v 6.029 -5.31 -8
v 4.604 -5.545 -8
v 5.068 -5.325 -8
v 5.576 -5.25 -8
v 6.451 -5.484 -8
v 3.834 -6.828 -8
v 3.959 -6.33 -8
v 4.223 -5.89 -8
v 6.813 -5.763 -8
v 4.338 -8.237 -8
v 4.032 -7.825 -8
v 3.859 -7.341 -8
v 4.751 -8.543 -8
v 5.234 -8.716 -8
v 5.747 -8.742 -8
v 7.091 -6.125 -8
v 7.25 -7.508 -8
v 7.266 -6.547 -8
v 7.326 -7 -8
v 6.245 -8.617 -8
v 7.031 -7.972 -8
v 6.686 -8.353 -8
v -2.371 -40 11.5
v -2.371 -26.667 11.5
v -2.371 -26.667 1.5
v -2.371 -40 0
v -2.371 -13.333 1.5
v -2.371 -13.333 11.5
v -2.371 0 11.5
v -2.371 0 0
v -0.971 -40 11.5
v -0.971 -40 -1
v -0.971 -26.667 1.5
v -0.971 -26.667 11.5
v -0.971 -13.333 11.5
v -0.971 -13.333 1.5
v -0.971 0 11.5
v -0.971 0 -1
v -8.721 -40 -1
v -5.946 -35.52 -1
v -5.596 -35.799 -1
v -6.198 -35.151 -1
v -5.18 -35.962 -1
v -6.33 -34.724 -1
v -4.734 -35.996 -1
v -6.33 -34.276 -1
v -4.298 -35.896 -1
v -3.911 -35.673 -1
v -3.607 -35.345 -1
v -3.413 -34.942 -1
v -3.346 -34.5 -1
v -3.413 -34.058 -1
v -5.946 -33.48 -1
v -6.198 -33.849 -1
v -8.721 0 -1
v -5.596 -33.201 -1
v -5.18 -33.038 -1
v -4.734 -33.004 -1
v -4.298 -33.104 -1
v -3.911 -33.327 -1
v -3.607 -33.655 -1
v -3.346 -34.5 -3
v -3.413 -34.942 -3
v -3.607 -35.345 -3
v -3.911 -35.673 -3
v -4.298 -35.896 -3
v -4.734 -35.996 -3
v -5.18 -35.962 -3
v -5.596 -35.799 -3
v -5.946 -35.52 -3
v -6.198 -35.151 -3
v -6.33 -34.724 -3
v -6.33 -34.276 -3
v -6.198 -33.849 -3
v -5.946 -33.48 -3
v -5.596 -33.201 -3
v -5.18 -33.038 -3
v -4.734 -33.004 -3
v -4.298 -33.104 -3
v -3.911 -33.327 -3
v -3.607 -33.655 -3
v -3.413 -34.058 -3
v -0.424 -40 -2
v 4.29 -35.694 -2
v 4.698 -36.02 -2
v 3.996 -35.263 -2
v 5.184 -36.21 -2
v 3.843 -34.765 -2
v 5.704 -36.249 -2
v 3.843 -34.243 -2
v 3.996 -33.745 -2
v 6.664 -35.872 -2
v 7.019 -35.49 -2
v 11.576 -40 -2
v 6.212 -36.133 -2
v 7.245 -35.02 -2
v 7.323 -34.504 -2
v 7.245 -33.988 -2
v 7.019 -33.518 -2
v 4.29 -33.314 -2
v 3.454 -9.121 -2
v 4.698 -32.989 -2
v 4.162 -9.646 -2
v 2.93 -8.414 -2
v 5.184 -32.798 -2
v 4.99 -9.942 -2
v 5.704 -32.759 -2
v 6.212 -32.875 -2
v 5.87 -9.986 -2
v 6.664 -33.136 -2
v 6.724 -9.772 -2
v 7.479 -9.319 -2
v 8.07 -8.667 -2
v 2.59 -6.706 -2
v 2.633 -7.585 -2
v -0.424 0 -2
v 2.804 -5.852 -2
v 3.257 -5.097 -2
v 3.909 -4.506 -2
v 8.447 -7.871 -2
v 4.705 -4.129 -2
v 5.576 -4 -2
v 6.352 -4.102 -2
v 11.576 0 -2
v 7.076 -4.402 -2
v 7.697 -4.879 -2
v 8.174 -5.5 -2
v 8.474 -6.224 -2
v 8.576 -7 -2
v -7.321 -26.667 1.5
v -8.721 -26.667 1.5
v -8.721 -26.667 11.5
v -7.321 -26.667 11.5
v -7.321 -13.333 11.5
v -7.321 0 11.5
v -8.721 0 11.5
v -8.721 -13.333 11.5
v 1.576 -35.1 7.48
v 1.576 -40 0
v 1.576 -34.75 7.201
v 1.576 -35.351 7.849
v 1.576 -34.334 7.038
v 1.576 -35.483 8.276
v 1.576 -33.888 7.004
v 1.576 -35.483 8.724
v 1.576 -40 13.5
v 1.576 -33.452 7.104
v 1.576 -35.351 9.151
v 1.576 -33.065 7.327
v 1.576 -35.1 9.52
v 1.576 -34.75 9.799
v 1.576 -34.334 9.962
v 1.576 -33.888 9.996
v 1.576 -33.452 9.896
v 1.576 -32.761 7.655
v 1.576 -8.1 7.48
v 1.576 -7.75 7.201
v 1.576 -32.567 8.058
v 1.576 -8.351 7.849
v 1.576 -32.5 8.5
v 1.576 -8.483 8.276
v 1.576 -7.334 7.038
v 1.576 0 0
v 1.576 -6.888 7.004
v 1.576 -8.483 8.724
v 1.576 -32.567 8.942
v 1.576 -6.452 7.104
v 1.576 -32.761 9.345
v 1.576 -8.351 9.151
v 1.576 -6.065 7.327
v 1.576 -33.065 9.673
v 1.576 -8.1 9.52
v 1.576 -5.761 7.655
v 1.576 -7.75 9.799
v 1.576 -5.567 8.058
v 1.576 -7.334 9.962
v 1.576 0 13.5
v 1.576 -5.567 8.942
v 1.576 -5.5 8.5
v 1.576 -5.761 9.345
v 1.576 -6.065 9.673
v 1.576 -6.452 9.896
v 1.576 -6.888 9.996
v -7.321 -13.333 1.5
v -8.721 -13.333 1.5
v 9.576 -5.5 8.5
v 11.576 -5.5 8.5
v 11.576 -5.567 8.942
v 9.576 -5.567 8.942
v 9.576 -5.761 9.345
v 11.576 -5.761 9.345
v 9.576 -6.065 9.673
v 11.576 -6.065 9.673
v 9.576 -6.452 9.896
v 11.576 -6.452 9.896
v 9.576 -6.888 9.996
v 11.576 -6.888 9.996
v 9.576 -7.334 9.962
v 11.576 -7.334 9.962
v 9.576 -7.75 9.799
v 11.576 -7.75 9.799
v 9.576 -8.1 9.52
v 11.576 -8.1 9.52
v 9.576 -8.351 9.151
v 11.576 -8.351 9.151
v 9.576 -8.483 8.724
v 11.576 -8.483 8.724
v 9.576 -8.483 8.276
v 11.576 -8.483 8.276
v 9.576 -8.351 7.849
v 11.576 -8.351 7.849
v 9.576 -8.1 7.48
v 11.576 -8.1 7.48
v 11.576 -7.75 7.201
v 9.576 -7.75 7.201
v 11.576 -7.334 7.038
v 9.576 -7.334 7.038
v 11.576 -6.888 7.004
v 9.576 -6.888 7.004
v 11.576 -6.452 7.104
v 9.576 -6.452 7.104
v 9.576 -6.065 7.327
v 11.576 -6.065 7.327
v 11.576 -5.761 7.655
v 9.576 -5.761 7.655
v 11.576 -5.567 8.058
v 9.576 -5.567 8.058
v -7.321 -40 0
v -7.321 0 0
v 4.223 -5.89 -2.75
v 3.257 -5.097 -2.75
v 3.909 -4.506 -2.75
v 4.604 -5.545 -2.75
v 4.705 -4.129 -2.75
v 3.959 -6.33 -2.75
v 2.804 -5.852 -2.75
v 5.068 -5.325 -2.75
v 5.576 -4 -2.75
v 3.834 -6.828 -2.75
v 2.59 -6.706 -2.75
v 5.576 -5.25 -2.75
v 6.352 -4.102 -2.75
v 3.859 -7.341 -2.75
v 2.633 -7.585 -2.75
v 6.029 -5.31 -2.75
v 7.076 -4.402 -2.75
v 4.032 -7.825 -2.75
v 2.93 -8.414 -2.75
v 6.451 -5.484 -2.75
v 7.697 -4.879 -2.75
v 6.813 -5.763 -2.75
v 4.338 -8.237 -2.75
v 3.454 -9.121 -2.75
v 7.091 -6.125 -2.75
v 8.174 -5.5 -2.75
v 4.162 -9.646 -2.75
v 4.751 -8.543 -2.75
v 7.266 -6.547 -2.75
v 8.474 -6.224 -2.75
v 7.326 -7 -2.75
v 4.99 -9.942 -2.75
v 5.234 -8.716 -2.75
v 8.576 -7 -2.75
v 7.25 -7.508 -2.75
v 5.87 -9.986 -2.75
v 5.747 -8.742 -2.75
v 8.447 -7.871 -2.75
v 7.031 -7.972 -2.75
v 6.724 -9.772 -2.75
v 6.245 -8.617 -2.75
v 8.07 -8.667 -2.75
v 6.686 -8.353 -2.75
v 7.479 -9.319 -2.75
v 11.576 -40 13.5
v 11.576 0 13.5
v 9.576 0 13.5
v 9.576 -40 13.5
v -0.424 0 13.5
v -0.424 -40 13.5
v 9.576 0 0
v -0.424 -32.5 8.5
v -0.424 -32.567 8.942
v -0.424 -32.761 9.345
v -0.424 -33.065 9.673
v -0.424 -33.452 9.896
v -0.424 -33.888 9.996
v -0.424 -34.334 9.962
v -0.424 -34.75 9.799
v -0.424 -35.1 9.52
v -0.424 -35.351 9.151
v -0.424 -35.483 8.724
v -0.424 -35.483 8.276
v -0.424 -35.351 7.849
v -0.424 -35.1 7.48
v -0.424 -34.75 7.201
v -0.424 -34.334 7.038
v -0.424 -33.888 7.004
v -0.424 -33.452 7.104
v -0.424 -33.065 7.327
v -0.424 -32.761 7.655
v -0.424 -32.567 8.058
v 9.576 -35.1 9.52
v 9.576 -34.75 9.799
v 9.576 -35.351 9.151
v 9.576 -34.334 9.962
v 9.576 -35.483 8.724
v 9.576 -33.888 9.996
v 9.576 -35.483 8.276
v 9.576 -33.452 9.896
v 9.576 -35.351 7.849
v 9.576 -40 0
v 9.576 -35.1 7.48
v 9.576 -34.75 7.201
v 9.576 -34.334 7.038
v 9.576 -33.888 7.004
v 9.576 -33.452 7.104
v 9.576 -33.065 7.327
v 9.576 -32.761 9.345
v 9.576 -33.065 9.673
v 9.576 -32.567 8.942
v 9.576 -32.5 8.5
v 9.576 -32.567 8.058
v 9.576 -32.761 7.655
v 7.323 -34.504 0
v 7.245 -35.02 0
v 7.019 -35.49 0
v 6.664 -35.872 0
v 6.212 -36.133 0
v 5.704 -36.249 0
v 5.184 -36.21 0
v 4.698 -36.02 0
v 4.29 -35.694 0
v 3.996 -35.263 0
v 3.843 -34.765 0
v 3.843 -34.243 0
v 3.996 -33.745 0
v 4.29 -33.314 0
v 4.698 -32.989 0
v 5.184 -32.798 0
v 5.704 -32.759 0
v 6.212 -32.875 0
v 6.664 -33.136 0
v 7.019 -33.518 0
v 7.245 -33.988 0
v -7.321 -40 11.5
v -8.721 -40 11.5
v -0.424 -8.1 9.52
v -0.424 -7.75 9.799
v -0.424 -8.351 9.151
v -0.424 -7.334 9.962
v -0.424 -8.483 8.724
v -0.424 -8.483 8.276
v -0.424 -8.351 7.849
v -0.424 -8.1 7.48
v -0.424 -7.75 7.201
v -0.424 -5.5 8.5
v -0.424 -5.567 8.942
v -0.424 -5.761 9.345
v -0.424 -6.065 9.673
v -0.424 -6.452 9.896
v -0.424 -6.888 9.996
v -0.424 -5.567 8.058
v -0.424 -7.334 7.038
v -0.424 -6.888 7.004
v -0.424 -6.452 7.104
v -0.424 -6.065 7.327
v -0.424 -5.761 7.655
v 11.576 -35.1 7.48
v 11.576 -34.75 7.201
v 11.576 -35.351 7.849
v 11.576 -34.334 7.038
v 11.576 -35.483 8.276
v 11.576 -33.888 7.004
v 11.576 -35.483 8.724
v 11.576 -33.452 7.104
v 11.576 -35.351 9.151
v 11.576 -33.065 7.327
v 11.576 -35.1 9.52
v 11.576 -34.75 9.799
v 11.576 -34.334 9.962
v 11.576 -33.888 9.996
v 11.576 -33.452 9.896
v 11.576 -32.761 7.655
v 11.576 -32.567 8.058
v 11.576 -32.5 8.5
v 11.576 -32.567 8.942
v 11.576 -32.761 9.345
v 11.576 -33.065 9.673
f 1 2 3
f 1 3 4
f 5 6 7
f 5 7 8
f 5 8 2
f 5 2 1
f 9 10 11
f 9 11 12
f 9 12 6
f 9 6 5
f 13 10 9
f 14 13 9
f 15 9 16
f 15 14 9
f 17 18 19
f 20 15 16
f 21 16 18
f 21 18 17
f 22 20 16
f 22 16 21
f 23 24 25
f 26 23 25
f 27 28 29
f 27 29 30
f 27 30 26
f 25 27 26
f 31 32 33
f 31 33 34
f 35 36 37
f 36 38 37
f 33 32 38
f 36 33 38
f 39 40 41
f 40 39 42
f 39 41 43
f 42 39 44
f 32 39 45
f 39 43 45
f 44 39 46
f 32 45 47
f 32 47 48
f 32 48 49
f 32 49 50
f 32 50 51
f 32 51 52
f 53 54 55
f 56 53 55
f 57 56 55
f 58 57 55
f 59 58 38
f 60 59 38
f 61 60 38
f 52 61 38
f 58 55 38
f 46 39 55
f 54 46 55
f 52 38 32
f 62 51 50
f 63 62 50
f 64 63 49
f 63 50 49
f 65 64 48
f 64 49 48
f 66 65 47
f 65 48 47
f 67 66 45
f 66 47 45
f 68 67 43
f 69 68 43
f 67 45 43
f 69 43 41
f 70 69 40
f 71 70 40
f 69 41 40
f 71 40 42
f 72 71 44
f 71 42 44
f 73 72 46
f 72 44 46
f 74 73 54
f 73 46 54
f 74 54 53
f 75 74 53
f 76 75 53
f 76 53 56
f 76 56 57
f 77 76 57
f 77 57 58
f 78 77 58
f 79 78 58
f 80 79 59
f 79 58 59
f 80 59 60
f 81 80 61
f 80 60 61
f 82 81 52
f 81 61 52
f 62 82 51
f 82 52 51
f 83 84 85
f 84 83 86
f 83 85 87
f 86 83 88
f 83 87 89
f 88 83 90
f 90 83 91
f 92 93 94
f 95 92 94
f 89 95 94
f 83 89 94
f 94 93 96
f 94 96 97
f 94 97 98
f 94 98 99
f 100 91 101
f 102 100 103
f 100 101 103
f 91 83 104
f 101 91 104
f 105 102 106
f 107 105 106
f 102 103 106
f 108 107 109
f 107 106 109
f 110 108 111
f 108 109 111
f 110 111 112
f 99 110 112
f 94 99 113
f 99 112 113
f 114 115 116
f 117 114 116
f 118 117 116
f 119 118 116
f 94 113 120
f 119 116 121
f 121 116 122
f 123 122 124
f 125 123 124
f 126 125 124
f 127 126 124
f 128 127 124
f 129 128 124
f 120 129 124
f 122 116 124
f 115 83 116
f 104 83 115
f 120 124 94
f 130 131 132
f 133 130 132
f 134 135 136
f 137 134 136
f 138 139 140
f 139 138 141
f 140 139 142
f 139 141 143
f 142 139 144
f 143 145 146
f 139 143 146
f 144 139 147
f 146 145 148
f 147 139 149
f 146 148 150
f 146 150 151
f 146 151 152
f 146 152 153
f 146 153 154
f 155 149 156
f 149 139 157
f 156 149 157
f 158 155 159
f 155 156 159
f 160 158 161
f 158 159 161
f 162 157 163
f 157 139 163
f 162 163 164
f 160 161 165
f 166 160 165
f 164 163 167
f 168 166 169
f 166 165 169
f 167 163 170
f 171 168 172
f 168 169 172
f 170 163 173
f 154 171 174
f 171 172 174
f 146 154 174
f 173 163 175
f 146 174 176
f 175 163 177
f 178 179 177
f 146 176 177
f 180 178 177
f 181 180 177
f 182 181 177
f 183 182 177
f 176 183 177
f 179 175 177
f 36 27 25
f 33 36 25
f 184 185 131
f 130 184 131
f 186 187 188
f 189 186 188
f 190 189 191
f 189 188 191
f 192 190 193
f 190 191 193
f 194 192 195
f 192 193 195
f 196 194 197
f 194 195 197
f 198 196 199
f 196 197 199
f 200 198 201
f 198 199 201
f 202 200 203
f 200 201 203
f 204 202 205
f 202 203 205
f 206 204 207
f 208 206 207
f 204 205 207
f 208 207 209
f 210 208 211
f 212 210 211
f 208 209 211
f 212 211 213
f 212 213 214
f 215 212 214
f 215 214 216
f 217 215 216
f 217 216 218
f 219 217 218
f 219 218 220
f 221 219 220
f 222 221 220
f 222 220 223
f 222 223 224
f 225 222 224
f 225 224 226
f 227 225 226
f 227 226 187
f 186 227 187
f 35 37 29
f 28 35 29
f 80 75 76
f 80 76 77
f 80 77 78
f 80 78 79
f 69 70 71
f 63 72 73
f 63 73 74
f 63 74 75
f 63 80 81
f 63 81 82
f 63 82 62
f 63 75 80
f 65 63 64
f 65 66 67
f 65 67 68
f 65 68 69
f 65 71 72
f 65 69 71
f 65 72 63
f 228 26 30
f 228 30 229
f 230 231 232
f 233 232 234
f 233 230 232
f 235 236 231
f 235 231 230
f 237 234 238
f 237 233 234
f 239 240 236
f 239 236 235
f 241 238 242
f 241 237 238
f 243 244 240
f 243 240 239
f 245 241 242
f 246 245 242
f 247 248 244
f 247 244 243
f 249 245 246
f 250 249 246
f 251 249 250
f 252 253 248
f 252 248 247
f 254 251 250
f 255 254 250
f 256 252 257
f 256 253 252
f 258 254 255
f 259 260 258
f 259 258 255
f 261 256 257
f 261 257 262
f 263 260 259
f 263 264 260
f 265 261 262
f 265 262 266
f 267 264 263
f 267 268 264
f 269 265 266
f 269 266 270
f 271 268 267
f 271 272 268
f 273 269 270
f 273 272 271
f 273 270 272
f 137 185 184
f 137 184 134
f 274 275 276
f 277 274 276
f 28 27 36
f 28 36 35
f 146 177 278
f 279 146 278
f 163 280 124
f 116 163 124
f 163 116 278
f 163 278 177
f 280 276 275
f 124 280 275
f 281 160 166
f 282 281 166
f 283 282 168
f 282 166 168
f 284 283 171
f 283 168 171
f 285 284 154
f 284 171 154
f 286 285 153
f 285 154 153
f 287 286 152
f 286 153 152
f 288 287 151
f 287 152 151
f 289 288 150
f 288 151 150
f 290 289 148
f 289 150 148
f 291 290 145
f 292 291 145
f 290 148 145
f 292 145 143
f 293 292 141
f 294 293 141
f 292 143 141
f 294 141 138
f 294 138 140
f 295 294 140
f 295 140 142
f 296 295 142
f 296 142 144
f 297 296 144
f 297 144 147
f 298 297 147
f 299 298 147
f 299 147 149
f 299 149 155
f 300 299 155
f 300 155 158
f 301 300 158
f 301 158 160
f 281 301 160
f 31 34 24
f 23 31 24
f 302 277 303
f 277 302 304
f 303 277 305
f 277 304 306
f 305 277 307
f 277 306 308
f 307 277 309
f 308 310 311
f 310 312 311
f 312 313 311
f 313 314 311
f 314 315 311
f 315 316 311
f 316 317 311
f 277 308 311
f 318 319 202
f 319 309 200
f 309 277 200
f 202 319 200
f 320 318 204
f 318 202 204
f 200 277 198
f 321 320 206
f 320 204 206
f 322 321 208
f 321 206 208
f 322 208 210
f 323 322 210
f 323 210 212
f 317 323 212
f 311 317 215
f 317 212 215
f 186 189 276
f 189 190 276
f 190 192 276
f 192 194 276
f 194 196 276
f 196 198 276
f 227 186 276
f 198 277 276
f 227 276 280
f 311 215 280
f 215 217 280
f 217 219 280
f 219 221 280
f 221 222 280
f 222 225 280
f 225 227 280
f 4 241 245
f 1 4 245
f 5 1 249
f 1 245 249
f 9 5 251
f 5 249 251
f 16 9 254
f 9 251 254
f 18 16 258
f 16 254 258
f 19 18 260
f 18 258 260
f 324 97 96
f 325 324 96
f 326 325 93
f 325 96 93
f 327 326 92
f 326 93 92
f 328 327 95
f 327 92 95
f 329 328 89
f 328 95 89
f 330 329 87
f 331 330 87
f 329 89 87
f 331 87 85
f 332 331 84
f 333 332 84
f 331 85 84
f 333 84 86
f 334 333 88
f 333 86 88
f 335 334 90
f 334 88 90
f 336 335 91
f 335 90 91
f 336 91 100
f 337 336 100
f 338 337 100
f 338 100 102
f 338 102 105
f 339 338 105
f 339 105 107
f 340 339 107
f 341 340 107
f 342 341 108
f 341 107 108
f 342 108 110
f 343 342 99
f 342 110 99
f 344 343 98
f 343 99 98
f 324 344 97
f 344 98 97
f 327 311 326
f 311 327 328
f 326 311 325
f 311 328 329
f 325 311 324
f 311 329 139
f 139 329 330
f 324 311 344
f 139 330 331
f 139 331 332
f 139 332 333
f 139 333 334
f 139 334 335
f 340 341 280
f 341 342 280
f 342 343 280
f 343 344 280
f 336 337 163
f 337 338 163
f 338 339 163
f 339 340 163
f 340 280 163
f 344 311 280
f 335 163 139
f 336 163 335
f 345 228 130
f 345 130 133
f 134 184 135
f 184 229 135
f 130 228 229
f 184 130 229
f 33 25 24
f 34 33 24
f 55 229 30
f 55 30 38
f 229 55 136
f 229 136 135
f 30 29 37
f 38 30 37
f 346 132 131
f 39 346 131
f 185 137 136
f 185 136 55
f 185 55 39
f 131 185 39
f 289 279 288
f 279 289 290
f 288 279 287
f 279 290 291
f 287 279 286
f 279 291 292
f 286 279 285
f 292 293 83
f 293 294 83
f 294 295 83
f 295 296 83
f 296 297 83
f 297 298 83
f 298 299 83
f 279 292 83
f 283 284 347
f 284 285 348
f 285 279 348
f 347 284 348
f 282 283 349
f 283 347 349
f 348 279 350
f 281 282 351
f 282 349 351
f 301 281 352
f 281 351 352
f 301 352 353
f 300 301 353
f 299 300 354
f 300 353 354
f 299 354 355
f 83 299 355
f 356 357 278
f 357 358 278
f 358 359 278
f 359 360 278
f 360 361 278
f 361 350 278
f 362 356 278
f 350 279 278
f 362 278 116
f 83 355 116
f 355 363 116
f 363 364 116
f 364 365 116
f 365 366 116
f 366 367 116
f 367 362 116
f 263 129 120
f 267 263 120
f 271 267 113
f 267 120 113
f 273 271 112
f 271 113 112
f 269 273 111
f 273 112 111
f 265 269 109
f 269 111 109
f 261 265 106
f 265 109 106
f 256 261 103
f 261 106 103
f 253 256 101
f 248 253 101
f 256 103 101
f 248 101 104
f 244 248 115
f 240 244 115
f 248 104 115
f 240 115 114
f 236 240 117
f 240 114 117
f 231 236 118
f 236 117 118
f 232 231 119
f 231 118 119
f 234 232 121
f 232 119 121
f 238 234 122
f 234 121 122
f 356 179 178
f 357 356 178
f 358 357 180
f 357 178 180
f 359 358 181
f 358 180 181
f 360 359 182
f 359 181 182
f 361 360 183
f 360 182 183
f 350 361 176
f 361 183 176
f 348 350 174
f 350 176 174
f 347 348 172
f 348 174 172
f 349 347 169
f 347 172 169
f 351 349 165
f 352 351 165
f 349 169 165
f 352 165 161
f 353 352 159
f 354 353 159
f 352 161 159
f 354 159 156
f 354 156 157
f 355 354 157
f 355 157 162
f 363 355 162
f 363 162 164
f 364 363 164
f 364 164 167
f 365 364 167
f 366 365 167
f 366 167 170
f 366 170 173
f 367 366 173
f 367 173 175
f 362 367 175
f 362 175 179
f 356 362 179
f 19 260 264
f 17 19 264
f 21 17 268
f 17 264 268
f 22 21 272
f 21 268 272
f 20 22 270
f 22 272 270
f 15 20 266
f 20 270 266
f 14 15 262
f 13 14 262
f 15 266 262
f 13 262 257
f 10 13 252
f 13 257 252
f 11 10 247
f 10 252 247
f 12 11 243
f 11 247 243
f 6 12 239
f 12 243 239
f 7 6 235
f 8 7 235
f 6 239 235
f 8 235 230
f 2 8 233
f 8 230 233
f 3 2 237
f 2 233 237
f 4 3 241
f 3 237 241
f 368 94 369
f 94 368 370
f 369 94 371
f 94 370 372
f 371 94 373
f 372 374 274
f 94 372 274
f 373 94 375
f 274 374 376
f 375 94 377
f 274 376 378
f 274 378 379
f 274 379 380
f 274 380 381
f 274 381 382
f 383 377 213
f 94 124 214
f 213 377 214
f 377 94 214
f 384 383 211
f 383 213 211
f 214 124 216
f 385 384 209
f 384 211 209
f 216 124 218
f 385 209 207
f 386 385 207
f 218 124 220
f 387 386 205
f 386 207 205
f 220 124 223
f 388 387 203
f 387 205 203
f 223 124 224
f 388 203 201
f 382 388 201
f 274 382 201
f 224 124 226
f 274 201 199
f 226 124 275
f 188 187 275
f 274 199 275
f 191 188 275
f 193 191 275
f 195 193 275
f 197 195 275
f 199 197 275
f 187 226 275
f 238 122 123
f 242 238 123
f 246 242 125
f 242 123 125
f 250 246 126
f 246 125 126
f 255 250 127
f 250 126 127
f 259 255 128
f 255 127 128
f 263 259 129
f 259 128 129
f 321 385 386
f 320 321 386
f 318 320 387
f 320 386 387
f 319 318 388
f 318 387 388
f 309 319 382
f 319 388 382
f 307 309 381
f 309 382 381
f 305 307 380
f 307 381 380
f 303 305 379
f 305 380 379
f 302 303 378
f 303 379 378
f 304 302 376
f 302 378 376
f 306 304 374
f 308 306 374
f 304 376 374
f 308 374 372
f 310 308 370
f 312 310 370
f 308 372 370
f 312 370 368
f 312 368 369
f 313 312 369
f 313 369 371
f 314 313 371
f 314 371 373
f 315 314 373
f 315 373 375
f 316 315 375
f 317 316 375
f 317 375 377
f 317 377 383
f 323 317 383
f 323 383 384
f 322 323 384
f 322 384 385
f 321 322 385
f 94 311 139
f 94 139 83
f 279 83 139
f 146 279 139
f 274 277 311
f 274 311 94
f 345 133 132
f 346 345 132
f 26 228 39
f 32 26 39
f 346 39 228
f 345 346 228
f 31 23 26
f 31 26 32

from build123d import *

# Parameters (mm, degrees)
F2_DEPTH  = 40
F3_DEPTH  = 40
F4_W      = 13.333334
F4_H      = 10
F5_DEPTH  = 8
F6_R      = 1.5
F7_DEPTH  = 2
F9_DEPTH  = 0.75
F10_DEPTH = 6
F11_R     = 1.5
F12_DEPTH = 12
F13_R     = 1.75
F14_DEPTH = 2


with BuildPart() as f2:
    # F0 (on Front) → F2 (new body)
    with BuildSketch(Plane.XZ):
        Polygon((1.57576, 0), (1.57576, 13.5), (-0.42424, 13.5), (-0.42424, -2), (11.57576, -2), (11.57576, 13.5), (9.57576, 13.5), (9.57576, 0), align=None)
    extrude(amount=F2_DEPTH)

    # F8 (on face) → F9 (join)
    with BuildSketch(Plane(origin=(0, 0, -2), x_dir=(1, 0, 0), z_dir=(0, 0, -1))):
        with BuildLine():
            ThreePointArc((7.32576, 7), (4.338323, 8.237437), (5.57576, 5.25))
            ThreePointArc((5.57576, 5.25), (6.813196, 5.762563), (7.32576, 7))
        make_face()
        with BuildLine():
            ThreePointArc((8.57576, 7), (3.454439, 9.12132), (5.57576, 4))
            ThreePointArc((5.57576, 4), (7.69708, 4.87868), (8.57576, 7))
        make_face()
        with BuildLine():
            ThreePointArc((7.32576, 7), (6.813196, 5.762563), (5.57576, 5.25))
            ThreePointArc((5.57576, 5.25), (4.338323, 8.237437), (7.32576, 7))
        make_face(mode=Mode.SUBTRACT)
    extrude(amount=F9_DEPTH)

    # F8 (on face) → F10 (join)
    with BuildSketch(Plane(origin=(0, 0, -2), x_dir=(1, 0, 0), z_dir=(0, 0, -1))):
        with BuildLine():
            ThreePointArc((7.32576, 7), (4.338323, 8.237437), (5.57576, 5.25))
            ThreePointArc((5.57576, 5.25), (6.813196, 5.762563), (7.32576, 7))
        make_face()
    extrude(amount=F10_DEPTH)

    # F11 (on face) → F12 (cut)
    with BuildSketch(Plane.YZ.offset(11.57576)):
        with Locations((-34, 8.5)):
            Circle(F11_R)
        with Locations((-7, 8.5)):
            Circle(F11_R)
    extrude(amount=-F12_DEPTH, mode=Mode.SUBTRACT)

    # F13 (on face) → F14 (cut)
    with BuildSketch(Plane(origin=(0, 0, -2), x_dir=(1, 0, 0), z_dir=(0, 0, -1))):
        with Locations((5.573067, 34.50406)):
            Circle(F13_R)
    extrude(amount=-F14_DEPTH, mode=Mode.SUBTRACT)


with BuildPart() as f3:
    # F1 (on Front) → F3 (new body)
    with BuildSketch(Plane.XZ):
        Polygon((-2.371435, 0), (-7.321435, 0), (-7.321435, 11.5), (-8.721435, 11.5), (-8.721435, -1), (-0.971435, -1), (-0.971435, 11.5), (-2.371435, 11.5), align=None)
    extrude(amount=F3_DEPTH)

    # F4 (on face) → F5 (cut)
    with BuildSketch(Plane(origin=(-8.721435, 0, 0), x_dir=(0, -1, 0), z_dir=(-1, 0, 0))):
        with Locations((20, 6.5)):
            Rectangle(F4_W, F4_H)
    extrude(amount=-F5_DEPTH, mode=Mode.SUBTRACT)

    # F6 (on face) → F7 (join)
    with BuildSketch(Plane(origin=(0, 0, -1), x_dir=(1, 0, 0), z_dir=(0, 0, -1))):
        with Locations((-4.846435, 34.5)):
            Circle(F6_R)
    extrude(amount=F7_DEPTH)


solid = Compound([f2.part, f3.part])
